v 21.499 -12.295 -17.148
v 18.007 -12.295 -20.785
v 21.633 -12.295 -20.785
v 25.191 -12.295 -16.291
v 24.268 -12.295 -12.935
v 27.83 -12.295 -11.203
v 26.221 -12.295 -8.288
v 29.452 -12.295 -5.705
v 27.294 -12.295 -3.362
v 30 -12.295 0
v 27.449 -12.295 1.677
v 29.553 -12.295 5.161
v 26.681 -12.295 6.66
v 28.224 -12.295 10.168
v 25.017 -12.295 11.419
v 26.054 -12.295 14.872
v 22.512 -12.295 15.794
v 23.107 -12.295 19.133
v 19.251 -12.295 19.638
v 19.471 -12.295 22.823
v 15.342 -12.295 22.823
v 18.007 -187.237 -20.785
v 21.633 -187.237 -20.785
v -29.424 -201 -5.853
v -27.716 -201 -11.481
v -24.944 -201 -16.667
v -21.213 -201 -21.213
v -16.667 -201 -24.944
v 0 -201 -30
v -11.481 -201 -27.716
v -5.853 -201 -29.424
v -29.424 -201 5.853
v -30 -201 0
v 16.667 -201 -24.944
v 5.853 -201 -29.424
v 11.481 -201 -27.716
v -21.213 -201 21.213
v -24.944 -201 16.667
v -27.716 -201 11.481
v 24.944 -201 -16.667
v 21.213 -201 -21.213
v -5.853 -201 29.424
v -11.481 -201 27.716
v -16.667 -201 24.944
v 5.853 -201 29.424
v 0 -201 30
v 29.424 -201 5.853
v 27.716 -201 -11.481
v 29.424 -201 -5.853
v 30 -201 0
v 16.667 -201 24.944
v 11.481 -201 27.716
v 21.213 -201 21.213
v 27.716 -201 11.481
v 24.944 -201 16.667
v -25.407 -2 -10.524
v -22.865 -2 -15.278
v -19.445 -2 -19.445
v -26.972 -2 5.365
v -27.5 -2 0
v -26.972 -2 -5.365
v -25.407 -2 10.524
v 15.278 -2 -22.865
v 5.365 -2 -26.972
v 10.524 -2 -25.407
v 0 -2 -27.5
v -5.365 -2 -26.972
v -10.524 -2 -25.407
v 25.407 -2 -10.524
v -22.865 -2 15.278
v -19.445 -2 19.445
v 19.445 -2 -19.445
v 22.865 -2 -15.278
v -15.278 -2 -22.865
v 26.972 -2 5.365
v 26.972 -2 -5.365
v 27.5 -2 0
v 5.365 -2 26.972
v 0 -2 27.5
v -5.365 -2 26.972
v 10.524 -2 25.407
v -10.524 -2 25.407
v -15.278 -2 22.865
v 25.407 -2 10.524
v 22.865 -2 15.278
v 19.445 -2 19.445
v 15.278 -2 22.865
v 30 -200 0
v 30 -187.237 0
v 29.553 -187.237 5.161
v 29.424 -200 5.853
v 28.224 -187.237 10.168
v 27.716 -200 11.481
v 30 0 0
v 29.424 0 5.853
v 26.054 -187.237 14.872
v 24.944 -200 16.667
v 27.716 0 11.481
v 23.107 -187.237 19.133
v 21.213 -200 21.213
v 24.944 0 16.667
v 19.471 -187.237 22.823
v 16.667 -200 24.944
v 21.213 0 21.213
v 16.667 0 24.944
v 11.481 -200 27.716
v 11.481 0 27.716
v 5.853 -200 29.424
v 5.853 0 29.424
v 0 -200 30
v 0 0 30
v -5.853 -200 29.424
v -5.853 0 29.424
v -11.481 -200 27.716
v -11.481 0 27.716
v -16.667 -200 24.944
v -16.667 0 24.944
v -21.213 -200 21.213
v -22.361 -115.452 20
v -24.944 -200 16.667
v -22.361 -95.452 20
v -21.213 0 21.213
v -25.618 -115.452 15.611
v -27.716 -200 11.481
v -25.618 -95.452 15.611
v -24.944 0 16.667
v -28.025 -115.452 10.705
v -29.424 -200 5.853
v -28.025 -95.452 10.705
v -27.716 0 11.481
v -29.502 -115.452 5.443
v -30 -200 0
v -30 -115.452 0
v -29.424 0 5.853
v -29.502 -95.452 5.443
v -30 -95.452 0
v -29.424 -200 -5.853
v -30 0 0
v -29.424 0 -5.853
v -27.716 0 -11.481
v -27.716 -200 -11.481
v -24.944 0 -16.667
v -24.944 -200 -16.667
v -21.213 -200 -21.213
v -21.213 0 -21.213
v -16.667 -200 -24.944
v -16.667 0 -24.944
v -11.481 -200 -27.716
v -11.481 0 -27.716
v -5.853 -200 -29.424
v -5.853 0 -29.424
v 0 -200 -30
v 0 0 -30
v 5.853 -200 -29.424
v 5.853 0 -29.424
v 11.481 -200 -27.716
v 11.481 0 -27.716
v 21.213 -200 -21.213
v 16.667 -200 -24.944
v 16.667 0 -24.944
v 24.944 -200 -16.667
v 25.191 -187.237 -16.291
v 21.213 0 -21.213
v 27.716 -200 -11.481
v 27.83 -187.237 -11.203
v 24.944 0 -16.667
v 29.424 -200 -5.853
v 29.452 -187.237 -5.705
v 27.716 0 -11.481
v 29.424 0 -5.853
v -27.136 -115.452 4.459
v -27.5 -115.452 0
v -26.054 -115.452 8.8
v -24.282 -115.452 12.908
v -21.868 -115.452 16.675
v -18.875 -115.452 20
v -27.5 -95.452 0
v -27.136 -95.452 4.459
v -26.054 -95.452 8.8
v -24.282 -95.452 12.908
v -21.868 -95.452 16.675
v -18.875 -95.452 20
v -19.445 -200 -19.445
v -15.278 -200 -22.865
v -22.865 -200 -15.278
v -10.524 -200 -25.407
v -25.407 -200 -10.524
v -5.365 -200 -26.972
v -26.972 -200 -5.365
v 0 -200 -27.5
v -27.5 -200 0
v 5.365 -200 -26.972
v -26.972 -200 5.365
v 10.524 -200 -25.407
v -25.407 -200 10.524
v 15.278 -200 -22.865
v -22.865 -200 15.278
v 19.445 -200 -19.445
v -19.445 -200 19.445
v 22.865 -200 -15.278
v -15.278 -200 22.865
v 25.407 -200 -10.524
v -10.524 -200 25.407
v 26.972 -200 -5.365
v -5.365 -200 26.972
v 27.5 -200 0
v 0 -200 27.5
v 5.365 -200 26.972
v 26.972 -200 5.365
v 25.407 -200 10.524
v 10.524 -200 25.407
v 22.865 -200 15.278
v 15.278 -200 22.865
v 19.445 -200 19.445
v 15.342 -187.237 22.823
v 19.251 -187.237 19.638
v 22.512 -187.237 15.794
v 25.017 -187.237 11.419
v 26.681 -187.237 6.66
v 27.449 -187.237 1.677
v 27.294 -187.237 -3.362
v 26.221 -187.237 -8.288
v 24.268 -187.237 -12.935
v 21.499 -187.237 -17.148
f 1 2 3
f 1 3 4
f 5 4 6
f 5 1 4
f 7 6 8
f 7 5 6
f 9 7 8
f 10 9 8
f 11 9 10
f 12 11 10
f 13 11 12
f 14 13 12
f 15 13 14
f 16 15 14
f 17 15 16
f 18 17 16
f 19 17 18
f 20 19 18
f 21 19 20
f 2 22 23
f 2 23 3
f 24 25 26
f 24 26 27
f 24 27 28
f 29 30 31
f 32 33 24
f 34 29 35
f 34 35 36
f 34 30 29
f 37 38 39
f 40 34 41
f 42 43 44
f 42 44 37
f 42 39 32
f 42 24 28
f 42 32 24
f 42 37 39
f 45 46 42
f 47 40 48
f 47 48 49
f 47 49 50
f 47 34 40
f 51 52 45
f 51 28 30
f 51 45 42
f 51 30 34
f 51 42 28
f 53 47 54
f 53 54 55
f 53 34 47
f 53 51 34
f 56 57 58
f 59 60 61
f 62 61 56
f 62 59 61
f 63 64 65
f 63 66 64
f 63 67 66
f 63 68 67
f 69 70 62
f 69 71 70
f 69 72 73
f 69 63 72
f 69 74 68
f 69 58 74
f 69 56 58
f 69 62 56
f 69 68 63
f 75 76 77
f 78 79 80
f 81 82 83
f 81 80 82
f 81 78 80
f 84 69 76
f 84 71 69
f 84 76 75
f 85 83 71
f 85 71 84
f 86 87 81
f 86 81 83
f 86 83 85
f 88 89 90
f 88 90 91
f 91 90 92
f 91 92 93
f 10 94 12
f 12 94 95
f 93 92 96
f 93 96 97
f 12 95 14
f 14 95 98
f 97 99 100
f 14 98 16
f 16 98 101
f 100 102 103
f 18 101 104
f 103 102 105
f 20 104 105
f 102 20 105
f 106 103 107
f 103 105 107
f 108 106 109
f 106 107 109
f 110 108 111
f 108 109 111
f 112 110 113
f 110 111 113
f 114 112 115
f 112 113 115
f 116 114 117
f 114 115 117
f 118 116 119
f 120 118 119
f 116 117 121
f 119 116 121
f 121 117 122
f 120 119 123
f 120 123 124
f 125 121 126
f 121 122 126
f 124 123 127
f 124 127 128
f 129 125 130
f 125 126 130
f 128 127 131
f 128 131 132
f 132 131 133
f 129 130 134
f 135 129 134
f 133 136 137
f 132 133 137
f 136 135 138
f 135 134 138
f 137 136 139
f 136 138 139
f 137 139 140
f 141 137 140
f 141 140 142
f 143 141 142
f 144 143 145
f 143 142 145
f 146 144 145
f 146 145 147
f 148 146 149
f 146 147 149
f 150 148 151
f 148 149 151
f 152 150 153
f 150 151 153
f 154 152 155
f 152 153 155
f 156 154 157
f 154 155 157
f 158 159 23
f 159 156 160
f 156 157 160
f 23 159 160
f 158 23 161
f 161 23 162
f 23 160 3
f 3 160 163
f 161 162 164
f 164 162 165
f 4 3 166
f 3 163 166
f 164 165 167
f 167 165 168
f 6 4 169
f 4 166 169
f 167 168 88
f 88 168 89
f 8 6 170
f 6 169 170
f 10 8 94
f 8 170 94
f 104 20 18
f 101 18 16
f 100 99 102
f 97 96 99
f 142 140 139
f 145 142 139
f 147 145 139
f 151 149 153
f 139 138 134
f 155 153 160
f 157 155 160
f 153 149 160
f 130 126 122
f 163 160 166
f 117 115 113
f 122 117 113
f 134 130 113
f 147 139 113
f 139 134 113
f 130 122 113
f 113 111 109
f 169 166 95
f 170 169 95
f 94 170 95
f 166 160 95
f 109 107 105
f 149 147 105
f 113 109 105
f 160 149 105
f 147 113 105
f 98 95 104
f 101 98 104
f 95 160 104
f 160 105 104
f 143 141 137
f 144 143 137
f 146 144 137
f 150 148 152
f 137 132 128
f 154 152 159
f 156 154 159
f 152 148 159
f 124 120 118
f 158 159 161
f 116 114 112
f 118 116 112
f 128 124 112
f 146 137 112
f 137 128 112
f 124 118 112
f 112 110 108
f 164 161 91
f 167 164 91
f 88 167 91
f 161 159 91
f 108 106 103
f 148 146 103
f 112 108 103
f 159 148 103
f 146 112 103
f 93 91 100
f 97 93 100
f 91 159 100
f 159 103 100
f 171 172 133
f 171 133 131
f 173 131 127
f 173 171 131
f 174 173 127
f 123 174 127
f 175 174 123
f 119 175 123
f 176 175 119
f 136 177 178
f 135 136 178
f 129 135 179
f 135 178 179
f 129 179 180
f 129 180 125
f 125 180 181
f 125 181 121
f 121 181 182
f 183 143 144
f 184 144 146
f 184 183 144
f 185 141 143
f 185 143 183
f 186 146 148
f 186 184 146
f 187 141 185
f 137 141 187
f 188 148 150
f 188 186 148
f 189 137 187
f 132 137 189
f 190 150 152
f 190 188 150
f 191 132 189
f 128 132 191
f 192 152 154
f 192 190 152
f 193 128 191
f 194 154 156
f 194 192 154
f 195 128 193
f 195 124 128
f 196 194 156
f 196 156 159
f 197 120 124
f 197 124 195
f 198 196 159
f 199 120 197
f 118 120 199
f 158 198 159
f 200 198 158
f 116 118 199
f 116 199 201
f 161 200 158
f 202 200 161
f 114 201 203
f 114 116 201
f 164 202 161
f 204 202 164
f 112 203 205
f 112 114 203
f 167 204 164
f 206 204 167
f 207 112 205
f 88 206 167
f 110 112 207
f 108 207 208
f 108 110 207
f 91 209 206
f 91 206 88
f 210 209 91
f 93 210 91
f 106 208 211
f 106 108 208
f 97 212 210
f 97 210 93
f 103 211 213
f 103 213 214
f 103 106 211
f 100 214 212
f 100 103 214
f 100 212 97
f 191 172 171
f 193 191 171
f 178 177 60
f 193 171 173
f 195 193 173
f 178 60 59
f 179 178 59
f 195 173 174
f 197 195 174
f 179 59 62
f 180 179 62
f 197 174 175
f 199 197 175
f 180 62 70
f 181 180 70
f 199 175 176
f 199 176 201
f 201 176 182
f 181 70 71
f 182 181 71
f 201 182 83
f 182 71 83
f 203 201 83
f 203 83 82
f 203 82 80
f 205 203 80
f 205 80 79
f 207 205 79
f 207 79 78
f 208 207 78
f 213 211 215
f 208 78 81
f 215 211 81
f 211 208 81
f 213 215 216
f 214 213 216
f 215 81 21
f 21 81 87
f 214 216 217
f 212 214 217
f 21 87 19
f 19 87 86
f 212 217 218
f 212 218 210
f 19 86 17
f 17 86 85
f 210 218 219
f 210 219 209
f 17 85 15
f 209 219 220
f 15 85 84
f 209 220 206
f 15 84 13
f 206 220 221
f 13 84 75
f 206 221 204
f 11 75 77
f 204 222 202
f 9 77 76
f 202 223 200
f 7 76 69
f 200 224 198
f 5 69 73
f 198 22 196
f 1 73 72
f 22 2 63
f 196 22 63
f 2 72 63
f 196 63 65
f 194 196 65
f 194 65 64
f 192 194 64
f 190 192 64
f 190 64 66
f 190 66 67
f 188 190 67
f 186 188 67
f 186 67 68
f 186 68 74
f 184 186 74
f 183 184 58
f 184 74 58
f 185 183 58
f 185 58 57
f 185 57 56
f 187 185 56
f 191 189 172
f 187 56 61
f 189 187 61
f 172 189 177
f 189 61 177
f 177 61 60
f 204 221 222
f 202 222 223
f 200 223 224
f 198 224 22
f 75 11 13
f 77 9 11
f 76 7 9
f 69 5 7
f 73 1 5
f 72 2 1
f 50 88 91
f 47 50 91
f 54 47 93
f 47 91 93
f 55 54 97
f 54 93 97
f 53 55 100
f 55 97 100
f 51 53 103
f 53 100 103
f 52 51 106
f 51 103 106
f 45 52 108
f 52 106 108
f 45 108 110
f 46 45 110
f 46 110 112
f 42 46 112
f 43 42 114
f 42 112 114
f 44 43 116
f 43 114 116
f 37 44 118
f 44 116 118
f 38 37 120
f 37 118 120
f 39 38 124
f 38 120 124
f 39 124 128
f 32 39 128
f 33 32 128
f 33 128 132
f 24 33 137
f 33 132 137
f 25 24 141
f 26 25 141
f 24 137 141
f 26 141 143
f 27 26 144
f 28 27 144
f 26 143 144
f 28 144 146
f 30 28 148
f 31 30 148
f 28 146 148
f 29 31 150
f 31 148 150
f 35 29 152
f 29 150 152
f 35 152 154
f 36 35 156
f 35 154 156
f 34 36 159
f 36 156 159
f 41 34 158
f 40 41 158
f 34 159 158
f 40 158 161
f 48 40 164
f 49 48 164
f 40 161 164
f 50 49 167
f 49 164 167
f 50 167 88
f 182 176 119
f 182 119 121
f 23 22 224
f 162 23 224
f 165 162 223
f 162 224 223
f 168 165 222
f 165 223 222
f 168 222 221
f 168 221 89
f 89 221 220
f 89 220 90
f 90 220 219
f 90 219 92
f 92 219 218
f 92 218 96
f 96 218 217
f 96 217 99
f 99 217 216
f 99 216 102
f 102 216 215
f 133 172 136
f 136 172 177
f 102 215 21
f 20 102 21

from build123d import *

# Parameters (mm, degrees)
F0_R      = 30
F1_DEPTH  = 200
F2_R      = 27.5
F3_DEPTH  = 200
F4_R      = 30
F5_DEPTH  = 2
F6_R      = 30
F6_R_2    = 27.5
F7_DEPTH  = 1
F8_W      = 20
F8_H      = 20
F9_DEPTH  = 67.5
F10_W     = 174.9420631677
F10_H     = 43.6072610319
F11_DEPTH = 173


with BuildPart() as f1:
    # F0 (on Front) → F1 (new body)
    with BuildSketch(Plane.XZ):
        Circle(F0_R)
    extrude(amount=F1_DEPTH)

    # F2 (on face) → F3 (cut, through all)
    with BuildSketch(Plane(origin=(0, 0, 0), x_dir=(-1, 0, 0), z_dir=(0, 1, 0))):
        Circle(F2_R)
    extrude(amount=-F3_DEPTH, mode=Mode.SUBTRACT)

    # F4 (on Front) → F5 (join)
    with BuildSketch(Plane.XZ):
        Circle(F4_R)
    extrude(amount=F5_DEPTH)

    # F8 (on Right) → F9 (cut)
    with BuildSketch(Plane.YZ):
        with Locations((-105.4523052443, 10)):
            Rectangle(F8_W, F8_H)
    extrude(amount=-F9_DEPTH, mode=Mode.SUBTRACT)

    # F10 (on Right) → F11 (cut)
    with BuildSketch(Plane.YZ):
        with Locations((-99.765769206, 1.0190196335)):
            Rectangle(F10_W, F10_H)
    extrude(amount=F11_DEPTH, mode=Mode.SUBTRACT)


with BuildPart() as f7:
    # F6 (on face) → F7 (new body)
    with BuildSketch(Plane.XZ.offset(200)):
        Circle(F6_R)
        Circle(F6_R_2, mode=Mode.SUBTRACT)
        Circle(F6_R_2)
    extrude(amount=F7_DEPTH)


solid = Compound([f1.part, f7.part])
